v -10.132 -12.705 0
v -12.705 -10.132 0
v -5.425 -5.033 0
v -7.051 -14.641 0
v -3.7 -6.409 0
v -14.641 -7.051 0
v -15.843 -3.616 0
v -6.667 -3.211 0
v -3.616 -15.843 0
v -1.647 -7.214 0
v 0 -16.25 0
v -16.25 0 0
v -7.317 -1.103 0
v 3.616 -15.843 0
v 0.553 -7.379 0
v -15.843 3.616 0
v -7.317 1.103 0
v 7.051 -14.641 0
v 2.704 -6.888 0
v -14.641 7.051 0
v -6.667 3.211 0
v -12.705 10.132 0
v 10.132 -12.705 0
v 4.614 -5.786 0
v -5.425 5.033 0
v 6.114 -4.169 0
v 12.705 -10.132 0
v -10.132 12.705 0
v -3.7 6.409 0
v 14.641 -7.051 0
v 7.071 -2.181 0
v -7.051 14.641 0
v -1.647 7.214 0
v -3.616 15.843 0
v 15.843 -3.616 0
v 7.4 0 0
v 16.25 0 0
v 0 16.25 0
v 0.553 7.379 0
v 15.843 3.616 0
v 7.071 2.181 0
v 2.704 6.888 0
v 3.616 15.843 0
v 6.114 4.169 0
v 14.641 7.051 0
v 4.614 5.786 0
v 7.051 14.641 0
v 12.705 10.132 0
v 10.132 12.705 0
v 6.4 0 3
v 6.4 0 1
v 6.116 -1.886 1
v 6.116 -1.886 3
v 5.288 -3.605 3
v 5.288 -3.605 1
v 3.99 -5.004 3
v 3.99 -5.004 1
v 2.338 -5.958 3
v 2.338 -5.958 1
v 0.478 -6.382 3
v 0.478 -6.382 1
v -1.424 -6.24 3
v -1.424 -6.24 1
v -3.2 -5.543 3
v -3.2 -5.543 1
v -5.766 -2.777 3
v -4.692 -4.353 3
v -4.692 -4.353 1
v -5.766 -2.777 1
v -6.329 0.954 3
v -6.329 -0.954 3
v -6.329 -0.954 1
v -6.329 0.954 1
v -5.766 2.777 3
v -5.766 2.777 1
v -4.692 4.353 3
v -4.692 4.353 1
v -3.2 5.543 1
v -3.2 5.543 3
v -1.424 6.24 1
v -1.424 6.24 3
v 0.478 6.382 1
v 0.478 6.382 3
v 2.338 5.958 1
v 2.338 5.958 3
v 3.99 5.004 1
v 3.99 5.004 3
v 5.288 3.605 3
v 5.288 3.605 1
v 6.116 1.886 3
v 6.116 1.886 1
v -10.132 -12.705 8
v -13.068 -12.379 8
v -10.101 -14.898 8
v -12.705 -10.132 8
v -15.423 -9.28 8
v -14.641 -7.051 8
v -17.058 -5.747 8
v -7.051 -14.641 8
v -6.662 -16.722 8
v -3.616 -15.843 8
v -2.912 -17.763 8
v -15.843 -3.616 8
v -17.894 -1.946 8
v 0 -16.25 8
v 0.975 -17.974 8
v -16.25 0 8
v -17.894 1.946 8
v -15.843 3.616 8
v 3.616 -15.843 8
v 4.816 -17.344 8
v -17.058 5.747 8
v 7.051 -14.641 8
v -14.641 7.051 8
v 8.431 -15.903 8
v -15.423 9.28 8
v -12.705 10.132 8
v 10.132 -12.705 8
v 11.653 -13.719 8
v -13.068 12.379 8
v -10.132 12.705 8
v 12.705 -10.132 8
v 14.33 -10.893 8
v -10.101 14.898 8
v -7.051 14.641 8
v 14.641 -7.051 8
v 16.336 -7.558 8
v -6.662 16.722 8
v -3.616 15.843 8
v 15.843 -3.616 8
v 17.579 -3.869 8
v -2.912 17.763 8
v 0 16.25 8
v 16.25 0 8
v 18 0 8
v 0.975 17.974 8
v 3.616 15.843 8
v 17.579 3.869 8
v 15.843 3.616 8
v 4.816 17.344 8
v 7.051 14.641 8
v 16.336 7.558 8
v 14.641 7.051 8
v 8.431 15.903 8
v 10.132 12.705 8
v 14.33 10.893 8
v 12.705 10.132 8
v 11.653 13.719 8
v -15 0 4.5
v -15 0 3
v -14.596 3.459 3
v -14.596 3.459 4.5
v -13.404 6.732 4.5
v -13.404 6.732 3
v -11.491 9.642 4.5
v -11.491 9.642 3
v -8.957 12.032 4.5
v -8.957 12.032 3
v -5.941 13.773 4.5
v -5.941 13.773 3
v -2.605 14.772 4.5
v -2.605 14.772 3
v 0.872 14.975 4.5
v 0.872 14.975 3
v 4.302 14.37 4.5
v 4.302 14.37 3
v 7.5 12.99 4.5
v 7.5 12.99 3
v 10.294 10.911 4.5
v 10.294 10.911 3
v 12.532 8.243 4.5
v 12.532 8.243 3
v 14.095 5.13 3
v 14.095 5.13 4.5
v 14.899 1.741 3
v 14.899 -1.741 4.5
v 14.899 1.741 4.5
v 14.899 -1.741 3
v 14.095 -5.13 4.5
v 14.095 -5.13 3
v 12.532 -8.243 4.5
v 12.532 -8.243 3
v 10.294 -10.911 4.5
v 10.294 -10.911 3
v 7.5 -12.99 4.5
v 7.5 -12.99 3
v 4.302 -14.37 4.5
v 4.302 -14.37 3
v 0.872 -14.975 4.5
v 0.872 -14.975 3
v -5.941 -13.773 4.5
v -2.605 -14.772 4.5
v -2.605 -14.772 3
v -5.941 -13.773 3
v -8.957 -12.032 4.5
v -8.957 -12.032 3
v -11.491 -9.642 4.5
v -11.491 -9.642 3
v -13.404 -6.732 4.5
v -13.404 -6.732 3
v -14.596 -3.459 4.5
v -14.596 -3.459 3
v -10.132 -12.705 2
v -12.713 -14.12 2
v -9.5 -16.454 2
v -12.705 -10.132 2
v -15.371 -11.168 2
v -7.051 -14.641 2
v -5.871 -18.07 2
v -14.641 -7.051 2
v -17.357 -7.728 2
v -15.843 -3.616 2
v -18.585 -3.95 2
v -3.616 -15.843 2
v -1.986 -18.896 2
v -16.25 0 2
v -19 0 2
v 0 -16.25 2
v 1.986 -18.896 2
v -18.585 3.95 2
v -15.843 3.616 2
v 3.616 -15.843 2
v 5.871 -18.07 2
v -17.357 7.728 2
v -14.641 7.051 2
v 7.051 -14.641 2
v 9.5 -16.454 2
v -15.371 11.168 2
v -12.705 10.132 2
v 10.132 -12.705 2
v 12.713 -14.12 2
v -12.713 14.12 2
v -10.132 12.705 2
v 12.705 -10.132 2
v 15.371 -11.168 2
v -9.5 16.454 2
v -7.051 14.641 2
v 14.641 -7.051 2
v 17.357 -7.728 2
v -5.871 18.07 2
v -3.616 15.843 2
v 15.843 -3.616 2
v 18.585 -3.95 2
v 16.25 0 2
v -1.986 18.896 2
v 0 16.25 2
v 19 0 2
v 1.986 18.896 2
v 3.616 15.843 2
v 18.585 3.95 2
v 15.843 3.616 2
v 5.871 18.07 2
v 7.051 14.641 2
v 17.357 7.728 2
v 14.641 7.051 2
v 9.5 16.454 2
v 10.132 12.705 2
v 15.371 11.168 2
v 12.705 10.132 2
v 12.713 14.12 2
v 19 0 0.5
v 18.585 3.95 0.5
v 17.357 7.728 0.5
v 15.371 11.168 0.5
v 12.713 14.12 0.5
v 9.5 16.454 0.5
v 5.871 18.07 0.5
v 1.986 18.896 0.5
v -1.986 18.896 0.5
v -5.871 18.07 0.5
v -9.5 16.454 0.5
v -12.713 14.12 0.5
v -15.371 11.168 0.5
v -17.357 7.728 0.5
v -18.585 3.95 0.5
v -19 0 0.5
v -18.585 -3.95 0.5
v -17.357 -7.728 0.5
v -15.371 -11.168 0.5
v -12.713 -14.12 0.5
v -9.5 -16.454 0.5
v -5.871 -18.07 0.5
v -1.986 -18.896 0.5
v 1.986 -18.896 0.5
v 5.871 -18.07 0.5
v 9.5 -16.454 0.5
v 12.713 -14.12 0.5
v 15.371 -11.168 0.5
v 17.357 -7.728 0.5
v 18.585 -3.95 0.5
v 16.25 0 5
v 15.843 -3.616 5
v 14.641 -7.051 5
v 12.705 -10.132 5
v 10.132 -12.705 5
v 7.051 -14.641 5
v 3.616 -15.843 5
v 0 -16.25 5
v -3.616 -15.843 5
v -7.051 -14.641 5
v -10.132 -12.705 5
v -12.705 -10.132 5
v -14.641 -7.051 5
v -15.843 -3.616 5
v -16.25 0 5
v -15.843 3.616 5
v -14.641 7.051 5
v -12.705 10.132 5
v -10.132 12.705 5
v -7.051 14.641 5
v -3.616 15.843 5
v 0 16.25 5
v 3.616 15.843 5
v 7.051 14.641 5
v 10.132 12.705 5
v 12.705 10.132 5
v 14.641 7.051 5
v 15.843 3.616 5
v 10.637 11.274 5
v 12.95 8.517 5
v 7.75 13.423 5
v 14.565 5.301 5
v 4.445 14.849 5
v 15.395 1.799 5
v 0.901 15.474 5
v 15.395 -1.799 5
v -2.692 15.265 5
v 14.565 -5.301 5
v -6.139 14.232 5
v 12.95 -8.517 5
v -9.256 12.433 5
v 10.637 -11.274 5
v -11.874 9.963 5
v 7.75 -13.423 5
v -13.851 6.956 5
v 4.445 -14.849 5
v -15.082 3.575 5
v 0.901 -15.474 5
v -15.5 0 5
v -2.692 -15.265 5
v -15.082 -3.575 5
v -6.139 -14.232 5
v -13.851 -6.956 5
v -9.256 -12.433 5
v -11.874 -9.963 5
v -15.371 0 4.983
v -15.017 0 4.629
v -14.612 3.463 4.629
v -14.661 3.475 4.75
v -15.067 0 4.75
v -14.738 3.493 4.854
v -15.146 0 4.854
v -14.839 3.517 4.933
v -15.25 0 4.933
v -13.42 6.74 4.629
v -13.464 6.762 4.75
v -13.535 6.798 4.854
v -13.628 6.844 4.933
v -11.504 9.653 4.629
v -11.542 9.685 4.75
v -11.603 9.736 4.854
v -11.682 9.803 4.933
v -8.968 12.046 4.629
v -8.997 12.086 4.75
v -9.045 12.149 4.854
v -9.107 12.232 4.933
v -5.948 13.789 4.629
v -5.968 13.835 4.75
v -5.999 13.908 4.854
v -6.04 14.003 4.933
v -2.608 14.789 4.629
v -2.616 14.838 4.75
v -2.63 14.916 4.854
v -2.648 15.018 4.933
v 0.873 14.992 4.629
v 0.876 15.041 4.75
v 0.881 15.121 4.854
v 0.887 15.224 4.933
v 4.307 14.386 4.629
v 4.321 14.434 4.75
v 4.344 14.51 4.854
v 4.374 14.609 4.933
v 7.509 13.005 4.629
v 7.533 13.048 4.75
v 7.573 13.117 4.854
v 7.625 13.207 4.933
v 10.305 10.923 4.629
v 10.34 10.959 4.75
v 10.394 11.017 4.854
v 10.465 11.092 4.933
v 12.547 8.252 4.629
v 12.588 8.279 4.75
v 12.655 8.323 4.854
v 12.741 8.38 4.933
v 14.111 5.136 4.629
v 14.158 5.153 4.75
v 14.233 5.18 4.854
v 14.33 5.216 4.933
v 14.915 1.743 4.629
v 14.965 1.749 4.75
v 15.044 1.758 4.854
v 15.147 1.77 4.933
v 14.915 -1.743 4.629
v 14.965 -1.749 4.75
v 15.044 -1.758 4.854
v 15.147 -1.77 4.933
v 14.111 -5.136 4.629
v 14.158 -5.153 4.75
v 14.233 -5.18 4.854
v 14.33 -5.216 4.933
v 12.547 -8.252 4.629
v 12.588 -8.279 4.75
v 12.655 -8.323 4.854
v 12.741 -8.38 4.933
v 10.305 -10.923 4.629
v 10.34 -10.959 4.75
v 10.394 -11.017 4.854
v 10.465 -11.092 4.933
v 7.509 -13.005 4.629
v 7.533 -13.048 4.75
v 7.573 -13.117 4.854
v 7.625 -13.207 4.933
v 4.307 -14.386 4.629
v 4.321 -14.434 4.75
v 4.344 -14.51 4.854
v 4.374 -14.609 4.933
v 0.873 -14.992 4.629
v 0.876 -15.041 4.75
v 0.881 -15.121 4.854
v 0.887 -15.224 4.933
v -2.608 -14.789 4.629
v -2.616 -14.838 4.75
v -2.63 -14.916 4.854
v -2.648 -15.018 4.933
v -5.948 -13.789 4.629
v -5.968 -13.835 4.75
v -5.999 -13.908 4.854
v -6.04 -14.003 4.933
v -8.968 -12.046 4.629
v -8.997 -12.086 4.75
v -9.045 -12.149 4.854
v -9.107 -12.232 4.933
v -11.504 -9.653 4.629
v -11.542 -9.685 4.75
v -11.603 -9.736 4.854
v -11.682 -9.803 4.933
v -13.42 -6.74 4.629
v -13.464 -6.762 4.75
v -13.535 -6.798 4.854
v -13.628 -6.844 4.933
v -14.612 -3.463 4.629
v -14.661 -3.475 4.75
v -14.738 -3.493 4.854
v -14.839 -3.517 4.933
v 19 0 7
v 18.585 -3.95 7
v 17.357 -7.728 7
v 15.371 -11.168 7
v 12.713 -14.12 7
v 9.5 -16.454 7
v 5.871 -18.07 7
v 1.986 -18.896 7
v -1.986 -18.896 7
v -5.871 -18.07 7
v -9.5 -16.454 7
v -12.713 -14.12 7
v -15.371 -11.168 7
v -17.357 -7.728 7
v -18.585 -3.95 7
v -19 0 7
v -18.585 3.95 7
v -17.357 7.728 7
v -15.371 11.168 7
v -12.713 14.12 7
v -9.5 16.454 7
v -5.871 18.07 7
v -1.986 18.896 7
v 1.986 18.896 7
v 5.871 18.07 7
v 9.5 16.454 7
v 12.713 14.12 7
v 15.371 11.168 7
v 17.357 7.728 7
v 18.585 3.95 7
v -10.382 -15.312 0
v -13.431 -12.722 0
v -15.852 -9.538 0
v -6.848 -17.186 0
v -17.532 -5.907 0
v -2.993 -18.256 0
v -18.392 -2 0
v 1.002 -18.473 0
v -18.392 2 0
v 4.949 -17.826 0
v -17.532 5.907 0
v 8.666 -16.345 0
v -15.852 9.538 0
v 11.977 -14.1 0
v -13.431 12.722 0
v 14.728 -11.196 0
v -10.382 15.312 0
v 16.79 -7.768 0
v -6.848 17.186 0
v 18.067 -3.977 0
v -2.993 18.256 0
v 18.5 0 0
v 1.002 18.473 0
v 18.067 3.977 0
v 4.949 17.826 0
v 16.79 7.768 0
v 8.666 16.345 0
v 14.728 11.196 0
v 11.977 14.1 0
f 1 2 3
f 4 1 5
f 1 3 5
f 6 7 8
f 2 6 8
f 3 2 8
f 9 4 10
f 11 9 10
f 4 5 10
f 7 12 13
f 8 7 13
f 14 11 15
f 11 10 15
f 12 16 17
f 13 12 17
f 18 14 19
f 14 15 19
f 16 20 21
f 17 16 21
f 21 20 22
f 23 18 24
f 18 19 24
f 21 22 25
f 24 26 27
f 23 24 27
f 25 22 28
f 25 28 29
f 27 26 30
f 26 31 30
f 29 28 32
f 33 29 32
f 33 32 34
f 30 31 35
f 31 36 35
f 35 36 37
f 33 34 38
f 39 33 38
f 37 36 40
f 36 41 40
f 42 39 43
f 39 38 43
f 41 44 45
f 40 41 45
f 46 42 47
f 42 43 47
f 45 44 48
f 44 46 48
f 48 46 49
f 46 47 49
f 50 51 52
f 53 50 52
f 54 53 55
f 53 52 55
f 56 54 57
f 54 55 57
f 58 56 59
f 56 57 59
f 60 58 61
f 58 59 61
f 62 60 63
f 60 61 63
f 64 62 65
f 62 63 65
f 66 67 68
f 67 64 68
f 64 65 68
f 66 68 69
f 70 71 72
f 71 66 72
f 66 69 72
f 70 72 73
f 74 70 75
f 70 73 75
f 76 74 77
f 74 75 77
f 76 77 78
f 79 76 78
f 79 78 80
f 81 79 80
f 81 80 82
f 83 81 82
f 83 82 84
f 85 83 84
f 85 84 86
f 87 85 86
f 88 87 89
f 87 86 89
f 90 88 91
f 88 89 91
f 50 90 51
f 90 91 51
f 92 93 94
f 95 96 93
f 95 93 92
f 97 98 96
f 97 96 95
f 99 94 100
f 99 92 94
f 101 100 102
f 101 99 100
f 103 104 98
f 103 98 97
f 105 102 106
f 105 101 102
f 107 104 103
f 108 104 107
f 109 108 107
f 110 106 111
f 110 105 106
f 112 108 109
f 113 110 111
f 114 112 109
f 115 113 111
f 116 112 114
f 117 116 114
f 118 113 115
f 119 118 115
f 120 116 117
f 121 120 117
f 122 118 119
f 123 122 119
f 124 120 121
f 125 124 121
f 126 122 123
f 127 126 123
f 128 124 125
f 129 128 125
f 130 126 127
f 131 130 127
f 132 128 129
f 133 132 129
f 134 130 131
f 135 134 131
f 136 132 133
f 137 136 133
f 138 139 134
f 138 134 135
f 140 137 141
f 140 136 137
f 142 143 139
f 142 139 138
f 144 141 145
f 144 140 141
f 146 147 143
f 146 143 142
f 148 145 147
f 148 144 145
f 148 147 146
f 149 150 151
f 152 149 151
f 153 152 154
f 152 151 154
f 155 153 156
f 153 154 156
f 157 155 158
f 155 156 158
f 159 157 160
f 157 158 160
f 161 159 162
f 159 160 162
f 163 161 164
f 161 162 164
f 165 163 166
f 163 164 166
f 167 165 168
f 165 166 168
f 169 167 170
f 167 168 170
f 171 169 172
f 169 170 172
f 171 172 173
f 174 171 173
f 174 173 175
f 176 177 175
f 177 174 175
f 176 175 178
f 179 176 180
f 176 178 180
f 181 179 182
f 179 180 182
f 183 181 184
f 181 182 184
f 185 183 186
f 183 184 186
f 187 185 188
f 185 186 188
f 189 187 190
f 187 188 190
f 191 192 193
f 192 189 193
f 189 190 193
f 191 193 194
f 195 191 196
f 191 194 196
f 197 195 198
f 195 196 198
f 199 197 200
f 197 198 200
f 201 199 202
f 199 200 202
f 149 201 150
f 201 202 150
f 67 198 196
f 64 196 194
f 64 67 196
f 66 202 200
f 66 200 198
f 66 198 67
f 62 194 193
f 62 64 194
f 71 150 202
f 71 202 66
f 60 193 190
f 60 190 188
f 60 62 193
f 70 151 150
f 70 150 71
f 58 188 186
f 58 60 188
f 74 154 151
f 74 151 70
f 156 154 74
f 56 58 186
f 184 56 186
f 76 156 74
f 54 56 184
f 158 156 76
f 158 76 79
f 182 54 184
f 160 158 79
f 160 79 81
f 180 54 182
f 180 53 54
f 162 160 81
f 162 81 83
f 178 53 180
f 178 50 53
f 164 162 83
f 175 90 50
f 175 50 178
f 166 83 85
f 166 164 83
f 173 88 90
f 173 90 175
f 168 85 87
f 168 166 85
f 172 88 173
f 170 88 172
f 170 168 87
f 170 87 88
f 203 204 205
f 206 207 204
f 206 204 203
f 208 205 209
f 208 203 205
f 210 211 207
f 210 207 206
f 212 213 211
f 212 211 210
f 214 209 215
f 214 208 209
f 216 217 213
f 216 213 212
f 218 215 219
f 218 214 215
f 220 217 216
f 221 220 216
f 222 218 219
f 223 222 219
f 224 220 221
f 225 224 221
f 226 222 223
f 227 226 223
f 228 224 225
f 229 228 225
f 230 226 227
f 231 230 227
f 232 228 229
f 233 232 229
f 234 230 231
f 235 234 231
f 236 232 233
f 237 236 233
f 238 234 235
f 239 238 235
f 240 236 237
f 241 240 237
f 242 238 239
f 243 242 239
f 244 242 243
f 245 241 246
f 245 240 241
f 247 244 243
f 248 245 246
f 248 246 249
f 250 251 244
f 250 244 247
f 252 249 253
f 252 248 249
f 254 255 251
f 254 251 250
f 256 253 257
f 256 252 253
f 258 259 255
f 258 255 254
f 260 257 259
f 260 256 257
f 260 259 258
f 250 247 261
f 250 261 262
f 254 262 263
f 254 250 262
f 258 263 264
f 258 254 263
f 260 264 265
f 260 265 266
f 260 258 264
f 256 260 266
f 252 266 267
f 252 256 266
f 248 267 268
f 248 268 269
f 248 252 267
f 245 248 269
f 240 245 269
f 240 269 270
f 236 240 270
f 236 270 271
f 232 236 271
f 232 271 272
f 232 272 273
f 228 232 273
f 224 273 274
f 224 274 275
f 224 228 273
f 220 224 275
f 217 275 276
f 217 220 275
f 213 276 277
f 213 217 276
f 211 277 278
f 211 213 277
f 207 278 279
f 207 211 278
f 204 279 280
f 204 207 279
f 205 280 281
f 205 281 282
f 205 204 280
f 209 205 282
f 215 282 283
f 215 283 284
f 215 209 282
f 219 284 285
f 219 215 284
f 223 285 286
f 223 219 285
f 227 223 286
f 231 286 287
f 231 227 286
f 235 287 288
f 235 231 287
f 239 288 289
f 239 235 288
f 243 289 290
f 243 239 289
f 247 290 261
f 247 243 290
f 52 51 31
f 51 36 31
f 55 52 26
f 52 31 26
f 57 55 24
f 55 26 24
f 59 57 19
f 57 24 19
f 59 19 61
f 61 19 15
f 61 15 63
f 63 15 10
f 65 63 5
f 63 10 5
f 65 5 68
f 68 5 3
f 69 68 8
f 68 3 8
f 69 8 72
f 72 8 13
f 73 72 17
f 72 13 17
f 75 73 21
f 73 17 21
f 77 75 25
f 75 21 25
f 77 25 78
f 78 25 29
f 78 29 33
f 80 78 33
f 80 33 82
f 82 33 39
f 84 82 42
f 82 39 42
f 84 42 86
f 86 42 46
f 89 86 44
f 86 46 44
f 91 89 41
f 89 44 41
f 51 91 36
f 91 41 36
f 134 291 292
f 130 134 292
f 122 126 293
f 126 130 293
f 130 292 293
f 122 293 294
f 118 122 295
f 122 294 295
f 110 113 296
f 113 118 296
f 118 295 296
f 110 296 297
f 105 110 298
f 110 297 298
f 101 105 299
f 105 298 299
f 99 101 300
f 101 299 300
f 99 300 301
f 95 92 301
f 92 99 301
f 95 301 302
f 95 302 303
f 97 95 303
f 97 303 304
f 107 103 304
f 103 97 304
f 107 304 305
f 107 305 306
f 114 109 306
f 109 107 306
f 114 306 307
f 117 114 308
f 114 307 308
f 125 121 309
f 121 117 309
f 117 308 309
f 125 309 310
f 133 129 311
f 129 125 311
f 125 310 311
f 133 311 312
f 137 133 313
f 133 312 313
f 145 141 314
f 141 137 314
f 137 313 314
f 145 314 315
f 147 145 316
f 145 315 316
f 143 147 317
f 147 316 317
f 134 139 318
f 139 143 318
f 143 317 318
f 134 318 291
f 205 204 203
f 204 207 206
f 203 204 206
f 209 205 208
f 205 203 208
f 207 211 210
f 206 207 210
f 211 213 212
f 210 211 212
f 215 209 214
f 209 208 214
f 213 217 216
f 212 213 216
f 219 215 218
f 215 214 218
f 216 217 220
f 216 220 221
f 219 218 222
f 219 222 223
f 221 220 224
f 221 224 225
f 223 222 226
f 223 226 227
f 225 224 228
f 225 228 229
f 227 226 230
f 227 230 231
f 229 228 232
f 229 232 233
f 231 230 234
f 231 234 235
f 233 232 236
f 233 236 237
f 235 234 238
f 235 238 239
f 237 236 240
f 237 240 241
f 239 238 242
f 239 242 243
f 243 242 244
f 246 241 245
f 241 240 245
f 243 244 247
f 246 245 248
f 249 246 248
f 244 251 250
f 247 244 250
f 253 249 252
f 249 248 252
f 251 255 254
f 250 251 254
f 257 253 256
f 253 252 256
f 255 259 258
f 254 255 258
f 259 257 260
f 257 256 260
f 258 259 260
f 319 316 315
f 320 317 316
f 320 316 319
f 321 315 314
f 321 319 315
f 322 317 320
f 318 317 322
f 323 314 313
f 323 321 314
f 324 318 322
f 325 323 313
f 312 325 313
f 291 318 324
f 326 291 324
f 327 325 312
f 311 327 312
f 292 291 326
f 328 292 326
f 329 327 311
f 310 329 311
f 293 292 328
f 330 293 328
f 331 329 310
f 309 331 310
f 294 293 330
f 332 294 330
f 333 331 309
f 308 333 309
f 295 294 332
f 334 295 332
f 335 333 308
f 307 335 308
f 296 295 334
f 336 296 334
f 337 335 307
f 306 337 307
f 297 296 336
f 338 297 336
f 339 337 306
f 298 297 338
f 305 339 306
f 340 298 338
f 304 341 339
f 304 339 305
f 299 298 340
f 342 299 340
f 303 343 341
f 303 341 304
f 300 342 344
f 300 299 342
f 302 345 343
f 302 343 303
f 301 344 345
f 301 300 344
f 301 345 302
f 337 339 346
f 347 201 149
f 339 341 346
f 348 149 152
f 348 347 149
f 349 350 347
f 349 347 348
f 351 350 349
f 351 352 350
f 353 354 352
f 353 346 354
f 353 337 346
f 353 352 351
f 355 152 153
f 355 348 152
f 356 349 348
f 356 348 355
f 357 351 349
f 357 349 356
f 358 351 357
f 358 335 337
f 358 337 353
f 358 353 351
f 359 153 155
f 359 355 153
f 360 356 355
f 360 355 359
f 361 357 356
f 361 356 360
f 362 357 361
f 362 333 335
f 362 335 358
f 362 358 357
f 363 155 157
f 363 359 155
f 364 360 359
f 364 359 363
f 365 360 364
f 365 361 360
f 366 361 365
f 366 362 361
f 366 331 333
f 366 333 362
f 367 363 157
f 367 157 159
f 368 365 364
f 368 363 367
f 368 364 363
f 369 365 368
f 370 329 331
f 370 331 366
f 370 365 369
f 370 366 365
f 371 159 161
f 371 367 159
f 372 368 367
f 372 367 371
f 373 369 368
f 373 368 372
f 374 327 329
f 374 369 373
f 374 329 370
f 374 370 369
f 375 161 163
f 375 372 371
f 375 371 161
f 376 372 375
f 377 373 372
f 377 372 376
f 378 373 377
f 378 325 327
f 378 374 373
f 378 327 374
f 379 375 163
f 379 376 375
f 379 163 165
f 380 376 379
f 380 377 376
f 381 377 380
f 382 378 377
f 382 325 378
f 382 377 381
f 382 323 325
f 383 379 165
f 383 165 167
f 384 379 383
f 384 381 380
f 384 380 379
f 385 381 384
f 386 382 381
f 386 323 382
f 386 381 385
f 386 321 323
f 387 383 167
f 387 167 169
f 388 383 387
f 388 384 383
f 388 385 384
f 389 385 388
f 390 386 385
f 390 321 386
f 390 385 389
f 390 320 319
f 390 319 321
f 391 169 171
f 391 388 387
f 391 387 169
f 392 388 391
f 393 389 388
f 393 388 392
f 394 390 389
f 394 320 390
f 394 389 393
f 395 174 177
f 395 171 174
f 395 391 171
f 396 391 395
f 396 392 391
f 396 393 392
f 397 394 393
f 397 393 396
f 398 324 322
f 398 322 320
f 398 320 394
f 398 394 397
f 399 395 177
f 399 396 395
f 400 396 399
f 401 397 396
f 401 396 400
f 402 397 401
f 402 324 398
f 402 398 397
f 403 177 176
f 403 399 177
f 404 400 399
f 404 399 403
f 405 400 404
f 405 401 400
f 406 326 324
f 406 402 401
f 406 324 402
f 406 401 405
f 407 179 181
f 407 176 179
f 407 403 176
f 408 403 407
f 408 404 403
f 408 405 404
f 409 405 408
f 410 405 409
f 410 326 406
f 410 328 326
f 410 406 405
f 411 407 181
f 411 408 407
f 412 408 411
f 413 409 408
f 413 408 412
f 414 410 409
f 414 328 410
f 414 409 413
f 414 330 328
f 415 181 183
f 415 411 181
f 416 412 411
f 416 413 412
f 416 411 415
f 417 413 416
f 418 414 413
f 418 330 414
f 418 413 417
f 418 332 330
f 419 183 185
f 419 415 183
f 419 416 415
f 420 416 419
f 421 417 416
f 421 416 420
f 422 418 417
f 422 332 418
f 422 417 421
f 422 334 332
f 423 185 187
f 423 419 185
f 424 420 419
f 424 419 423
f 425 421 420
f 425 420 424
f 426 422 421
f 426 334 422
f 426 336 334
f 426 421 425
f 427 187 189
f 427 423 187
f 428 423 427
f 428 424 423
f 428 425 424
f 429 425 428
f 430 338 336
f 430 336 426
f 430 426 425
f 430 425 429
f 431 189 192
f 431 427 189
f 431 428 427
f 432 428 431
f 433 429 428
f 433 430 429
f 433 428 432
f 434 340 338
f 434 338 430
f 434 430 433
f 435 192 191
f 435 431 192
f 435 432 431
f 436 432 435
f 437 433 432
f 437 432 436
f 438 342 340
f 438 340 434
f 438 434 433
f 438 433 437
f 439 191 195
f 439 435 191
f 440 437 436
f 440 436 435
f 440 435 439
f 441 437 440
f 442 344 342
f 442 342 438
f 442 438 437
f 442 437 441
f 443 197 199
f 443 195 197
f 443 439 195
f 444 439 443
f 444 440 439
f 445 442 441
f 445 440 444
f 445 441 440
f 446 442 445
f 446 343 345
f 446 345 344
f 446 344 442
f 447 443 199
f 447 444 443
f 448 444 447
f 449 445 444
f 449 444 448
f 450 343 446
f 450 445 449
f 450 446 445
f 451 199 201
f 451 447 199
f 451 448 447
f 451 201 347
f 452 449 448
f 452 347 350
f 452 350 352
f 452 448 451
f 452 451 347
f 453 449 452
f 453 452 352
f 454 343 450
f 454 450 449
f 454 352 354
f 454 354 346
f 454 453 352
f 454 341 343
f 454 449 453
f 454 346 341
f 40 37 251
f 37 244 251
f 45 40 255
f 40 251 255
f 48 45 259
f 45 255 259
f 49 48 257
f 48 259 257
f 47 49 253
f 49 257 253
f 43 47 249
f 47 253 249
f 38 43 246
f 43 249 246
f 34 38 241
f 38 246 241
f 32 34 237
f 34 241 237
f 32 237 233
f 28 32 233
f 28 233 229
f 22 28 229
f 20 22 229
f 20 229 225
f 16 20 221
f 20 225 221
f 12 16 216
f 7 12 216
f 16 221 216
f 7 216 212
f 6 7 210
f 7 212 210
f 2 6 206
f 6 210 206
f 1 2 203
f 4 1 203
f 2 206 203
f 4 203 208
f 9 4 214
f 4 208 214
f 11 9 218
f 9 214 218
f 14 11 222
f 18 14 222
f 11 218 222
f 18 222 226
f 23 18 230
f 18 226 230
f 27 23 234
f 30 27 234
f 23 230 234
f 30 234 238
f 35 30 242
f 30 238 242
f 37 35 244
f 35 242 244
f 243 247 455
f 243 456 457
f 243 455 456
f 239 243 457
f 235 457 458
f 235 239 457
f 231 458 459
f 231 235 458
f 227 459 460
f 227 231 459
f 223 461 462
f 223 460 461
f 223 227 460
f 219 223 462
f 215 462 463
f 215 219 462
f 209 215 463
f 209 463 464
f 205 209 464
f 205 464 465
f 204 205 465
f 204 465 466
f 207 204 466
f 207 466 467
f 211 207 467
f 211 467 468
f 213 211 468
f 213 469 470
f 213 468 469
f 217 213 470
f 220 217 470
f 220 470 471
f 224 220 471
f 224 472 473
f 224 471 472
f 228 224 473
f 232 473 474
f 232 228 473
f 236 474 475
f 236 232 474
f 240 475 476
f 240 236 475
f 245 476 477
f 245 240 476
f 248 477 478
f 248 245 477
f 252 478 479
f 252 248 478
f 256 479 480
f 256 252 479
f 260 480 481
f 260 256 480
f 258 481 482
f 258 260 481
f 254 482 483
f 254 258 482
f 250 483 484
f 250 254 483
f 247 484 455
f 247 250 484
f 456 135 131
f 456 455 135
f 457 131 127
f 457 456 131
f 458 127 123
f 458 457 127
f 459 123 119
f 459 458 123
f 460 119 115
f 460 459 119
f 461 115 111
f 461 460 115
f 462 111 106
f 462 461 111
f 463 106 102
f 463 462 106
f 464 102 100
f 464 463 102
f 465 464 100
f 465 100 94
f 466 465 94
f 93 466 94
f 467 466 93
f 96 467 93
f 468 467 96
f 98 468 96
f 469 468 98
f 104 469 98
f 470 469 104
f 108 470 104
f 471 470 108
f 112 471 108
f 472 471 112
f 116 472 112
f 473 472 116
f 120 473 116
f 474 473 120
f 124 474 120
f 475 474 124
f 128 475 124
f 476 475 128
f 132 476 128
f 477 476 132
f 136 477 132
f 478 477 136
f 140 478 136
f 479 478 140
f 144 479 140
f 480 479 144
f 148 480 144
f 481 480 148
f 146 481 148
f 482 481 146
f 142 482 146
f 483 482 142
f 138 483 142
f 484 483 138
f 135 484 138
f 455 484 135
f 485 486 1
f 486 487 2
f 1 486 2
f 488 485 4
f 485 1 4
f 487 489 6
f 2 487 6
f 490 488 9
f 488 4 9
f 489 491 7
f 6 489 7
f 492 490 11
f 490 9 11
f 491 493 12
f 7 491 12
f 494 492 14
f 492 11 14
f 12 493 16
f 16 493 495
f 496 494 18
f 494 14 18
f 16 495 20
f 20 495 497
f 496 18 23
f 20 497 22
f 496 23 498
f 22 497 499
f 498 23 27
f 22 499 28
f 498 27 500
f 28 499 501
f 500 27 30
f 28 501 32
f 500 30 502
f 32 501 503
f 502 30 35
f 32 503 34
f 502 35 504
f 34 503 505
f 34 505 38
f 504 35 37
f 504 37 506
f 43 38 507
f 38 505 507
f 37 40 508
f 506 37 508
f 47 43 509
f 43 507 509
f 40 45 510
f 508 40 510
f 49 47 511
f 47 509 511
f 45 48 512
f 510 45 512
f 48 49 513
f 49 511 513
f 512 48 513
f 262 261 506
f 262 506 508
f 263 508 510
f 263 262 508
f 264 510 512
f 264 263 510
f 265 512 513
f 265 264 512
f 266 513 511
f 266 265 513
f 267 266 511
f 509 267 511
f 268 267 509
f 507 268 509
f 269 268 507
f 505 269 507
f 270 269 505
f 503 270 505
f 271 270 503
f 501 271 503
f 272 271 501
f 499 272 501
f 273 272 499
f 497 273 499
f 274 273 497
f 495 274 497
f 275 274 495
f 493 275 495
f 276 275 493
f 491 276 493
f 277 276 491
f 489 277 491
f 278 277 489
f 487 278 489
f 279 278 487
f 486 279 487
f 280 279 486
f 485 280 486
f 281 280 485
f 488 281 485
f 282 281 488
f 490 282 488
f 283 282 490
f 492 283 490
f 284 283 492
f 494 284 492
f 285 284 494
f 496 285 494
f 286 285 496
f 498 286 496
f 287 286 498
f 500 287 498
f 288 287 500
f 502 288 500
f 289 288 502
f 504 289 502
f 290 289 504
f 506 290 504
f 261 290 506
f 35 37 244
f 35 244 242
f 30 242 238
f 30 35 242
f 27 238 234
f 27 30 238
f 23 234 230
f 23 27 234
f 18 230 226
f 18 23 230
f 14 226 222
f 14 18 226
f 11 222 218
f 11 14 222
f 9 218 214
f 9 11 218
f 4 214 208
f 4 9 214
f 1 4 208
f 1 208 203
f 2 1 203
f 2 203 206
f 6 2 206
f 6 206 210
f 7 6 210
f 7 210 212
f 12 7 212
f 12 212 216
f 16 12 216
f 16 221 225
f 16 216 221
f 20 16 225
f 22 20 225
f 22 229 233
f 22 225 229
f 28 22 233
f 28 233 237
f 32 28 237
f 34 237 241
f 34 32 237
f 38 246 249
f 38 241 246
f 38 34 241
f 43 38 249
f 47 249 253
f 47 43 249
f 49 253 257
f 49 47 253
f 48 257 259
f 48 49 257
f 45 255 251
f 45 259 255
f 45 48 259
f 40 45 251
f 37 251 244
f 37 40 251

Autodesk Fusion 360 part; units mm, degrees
sketch "Sketch1" plane through (0, 0, 0) normal (0, 0, 1) x (1, 0, 0)
  circle A0 centre (0, 0) radius 16.25
  circle A1 centre (0, 0) radius 19
  circle A2 centre (0, 0) radius 6.4
  dimension "d1" = 32.5
  dimension "d2" = 38
  dimension "d3" = 12.8
extrude "Extrude1" add sketch "Sketch1" along normal blind 8 contours A1 makes body 1
extrude "Extrude2" add sketch "Sketch1" along normal blind 3 contours A0 bodies 1
chamfer "Chamfer1" distance 1 angle 45 1 edges at (-17.7142, -6.8707, 8) on bodies 1
chamfer "Chamfer2" distance 1 angle 45 1 edges at (-5.9669, 2.3143, 0) on bodies 1
sketch "Sketch2" plane through (0, 0, 3) normal (0, 0, 1) x (-1, 0, 0)
  circle A0 centre (0, 0) radius 6.4
  circle A1 centre (0, 0) radius 16.25
  circle A2 centre (0, 0) radius 15
  dimension "d10" = 30
extrude "Extrude3" add sketch "Sketch2" along normal blind 2 contours A1 bodies 1
fillet "Fillet1" radius 0.5 1 edges at (13.9849, -5.4242, 5) on bodies 1
chamfer "Chamfer3" distance 0.5 angle 45 1 edges at (-17.7142, -6.8707, 0) on bodies 1
extrude "Extrude4" cut sketch "Sketch1" along normal blind 2 contours A1 bodies 1
extrude "Extrude1'" add 1 faces at (17.9521, -1.7512, 2) along direction (0, 0, -1) blind 2 separate body on bodies 1 makes body 2 in component "Color Ring"
chamfer "Chamfer1'" distance 0.5 angle 45 1 edges at (-17.7142, 6.8707, 0) on bodies 2 in component "Color Ring"
component "Color Ring" placed x (1, 0, 0) y (0, 1, 0) z (0, 0, 1) at (0, 0, 0)
